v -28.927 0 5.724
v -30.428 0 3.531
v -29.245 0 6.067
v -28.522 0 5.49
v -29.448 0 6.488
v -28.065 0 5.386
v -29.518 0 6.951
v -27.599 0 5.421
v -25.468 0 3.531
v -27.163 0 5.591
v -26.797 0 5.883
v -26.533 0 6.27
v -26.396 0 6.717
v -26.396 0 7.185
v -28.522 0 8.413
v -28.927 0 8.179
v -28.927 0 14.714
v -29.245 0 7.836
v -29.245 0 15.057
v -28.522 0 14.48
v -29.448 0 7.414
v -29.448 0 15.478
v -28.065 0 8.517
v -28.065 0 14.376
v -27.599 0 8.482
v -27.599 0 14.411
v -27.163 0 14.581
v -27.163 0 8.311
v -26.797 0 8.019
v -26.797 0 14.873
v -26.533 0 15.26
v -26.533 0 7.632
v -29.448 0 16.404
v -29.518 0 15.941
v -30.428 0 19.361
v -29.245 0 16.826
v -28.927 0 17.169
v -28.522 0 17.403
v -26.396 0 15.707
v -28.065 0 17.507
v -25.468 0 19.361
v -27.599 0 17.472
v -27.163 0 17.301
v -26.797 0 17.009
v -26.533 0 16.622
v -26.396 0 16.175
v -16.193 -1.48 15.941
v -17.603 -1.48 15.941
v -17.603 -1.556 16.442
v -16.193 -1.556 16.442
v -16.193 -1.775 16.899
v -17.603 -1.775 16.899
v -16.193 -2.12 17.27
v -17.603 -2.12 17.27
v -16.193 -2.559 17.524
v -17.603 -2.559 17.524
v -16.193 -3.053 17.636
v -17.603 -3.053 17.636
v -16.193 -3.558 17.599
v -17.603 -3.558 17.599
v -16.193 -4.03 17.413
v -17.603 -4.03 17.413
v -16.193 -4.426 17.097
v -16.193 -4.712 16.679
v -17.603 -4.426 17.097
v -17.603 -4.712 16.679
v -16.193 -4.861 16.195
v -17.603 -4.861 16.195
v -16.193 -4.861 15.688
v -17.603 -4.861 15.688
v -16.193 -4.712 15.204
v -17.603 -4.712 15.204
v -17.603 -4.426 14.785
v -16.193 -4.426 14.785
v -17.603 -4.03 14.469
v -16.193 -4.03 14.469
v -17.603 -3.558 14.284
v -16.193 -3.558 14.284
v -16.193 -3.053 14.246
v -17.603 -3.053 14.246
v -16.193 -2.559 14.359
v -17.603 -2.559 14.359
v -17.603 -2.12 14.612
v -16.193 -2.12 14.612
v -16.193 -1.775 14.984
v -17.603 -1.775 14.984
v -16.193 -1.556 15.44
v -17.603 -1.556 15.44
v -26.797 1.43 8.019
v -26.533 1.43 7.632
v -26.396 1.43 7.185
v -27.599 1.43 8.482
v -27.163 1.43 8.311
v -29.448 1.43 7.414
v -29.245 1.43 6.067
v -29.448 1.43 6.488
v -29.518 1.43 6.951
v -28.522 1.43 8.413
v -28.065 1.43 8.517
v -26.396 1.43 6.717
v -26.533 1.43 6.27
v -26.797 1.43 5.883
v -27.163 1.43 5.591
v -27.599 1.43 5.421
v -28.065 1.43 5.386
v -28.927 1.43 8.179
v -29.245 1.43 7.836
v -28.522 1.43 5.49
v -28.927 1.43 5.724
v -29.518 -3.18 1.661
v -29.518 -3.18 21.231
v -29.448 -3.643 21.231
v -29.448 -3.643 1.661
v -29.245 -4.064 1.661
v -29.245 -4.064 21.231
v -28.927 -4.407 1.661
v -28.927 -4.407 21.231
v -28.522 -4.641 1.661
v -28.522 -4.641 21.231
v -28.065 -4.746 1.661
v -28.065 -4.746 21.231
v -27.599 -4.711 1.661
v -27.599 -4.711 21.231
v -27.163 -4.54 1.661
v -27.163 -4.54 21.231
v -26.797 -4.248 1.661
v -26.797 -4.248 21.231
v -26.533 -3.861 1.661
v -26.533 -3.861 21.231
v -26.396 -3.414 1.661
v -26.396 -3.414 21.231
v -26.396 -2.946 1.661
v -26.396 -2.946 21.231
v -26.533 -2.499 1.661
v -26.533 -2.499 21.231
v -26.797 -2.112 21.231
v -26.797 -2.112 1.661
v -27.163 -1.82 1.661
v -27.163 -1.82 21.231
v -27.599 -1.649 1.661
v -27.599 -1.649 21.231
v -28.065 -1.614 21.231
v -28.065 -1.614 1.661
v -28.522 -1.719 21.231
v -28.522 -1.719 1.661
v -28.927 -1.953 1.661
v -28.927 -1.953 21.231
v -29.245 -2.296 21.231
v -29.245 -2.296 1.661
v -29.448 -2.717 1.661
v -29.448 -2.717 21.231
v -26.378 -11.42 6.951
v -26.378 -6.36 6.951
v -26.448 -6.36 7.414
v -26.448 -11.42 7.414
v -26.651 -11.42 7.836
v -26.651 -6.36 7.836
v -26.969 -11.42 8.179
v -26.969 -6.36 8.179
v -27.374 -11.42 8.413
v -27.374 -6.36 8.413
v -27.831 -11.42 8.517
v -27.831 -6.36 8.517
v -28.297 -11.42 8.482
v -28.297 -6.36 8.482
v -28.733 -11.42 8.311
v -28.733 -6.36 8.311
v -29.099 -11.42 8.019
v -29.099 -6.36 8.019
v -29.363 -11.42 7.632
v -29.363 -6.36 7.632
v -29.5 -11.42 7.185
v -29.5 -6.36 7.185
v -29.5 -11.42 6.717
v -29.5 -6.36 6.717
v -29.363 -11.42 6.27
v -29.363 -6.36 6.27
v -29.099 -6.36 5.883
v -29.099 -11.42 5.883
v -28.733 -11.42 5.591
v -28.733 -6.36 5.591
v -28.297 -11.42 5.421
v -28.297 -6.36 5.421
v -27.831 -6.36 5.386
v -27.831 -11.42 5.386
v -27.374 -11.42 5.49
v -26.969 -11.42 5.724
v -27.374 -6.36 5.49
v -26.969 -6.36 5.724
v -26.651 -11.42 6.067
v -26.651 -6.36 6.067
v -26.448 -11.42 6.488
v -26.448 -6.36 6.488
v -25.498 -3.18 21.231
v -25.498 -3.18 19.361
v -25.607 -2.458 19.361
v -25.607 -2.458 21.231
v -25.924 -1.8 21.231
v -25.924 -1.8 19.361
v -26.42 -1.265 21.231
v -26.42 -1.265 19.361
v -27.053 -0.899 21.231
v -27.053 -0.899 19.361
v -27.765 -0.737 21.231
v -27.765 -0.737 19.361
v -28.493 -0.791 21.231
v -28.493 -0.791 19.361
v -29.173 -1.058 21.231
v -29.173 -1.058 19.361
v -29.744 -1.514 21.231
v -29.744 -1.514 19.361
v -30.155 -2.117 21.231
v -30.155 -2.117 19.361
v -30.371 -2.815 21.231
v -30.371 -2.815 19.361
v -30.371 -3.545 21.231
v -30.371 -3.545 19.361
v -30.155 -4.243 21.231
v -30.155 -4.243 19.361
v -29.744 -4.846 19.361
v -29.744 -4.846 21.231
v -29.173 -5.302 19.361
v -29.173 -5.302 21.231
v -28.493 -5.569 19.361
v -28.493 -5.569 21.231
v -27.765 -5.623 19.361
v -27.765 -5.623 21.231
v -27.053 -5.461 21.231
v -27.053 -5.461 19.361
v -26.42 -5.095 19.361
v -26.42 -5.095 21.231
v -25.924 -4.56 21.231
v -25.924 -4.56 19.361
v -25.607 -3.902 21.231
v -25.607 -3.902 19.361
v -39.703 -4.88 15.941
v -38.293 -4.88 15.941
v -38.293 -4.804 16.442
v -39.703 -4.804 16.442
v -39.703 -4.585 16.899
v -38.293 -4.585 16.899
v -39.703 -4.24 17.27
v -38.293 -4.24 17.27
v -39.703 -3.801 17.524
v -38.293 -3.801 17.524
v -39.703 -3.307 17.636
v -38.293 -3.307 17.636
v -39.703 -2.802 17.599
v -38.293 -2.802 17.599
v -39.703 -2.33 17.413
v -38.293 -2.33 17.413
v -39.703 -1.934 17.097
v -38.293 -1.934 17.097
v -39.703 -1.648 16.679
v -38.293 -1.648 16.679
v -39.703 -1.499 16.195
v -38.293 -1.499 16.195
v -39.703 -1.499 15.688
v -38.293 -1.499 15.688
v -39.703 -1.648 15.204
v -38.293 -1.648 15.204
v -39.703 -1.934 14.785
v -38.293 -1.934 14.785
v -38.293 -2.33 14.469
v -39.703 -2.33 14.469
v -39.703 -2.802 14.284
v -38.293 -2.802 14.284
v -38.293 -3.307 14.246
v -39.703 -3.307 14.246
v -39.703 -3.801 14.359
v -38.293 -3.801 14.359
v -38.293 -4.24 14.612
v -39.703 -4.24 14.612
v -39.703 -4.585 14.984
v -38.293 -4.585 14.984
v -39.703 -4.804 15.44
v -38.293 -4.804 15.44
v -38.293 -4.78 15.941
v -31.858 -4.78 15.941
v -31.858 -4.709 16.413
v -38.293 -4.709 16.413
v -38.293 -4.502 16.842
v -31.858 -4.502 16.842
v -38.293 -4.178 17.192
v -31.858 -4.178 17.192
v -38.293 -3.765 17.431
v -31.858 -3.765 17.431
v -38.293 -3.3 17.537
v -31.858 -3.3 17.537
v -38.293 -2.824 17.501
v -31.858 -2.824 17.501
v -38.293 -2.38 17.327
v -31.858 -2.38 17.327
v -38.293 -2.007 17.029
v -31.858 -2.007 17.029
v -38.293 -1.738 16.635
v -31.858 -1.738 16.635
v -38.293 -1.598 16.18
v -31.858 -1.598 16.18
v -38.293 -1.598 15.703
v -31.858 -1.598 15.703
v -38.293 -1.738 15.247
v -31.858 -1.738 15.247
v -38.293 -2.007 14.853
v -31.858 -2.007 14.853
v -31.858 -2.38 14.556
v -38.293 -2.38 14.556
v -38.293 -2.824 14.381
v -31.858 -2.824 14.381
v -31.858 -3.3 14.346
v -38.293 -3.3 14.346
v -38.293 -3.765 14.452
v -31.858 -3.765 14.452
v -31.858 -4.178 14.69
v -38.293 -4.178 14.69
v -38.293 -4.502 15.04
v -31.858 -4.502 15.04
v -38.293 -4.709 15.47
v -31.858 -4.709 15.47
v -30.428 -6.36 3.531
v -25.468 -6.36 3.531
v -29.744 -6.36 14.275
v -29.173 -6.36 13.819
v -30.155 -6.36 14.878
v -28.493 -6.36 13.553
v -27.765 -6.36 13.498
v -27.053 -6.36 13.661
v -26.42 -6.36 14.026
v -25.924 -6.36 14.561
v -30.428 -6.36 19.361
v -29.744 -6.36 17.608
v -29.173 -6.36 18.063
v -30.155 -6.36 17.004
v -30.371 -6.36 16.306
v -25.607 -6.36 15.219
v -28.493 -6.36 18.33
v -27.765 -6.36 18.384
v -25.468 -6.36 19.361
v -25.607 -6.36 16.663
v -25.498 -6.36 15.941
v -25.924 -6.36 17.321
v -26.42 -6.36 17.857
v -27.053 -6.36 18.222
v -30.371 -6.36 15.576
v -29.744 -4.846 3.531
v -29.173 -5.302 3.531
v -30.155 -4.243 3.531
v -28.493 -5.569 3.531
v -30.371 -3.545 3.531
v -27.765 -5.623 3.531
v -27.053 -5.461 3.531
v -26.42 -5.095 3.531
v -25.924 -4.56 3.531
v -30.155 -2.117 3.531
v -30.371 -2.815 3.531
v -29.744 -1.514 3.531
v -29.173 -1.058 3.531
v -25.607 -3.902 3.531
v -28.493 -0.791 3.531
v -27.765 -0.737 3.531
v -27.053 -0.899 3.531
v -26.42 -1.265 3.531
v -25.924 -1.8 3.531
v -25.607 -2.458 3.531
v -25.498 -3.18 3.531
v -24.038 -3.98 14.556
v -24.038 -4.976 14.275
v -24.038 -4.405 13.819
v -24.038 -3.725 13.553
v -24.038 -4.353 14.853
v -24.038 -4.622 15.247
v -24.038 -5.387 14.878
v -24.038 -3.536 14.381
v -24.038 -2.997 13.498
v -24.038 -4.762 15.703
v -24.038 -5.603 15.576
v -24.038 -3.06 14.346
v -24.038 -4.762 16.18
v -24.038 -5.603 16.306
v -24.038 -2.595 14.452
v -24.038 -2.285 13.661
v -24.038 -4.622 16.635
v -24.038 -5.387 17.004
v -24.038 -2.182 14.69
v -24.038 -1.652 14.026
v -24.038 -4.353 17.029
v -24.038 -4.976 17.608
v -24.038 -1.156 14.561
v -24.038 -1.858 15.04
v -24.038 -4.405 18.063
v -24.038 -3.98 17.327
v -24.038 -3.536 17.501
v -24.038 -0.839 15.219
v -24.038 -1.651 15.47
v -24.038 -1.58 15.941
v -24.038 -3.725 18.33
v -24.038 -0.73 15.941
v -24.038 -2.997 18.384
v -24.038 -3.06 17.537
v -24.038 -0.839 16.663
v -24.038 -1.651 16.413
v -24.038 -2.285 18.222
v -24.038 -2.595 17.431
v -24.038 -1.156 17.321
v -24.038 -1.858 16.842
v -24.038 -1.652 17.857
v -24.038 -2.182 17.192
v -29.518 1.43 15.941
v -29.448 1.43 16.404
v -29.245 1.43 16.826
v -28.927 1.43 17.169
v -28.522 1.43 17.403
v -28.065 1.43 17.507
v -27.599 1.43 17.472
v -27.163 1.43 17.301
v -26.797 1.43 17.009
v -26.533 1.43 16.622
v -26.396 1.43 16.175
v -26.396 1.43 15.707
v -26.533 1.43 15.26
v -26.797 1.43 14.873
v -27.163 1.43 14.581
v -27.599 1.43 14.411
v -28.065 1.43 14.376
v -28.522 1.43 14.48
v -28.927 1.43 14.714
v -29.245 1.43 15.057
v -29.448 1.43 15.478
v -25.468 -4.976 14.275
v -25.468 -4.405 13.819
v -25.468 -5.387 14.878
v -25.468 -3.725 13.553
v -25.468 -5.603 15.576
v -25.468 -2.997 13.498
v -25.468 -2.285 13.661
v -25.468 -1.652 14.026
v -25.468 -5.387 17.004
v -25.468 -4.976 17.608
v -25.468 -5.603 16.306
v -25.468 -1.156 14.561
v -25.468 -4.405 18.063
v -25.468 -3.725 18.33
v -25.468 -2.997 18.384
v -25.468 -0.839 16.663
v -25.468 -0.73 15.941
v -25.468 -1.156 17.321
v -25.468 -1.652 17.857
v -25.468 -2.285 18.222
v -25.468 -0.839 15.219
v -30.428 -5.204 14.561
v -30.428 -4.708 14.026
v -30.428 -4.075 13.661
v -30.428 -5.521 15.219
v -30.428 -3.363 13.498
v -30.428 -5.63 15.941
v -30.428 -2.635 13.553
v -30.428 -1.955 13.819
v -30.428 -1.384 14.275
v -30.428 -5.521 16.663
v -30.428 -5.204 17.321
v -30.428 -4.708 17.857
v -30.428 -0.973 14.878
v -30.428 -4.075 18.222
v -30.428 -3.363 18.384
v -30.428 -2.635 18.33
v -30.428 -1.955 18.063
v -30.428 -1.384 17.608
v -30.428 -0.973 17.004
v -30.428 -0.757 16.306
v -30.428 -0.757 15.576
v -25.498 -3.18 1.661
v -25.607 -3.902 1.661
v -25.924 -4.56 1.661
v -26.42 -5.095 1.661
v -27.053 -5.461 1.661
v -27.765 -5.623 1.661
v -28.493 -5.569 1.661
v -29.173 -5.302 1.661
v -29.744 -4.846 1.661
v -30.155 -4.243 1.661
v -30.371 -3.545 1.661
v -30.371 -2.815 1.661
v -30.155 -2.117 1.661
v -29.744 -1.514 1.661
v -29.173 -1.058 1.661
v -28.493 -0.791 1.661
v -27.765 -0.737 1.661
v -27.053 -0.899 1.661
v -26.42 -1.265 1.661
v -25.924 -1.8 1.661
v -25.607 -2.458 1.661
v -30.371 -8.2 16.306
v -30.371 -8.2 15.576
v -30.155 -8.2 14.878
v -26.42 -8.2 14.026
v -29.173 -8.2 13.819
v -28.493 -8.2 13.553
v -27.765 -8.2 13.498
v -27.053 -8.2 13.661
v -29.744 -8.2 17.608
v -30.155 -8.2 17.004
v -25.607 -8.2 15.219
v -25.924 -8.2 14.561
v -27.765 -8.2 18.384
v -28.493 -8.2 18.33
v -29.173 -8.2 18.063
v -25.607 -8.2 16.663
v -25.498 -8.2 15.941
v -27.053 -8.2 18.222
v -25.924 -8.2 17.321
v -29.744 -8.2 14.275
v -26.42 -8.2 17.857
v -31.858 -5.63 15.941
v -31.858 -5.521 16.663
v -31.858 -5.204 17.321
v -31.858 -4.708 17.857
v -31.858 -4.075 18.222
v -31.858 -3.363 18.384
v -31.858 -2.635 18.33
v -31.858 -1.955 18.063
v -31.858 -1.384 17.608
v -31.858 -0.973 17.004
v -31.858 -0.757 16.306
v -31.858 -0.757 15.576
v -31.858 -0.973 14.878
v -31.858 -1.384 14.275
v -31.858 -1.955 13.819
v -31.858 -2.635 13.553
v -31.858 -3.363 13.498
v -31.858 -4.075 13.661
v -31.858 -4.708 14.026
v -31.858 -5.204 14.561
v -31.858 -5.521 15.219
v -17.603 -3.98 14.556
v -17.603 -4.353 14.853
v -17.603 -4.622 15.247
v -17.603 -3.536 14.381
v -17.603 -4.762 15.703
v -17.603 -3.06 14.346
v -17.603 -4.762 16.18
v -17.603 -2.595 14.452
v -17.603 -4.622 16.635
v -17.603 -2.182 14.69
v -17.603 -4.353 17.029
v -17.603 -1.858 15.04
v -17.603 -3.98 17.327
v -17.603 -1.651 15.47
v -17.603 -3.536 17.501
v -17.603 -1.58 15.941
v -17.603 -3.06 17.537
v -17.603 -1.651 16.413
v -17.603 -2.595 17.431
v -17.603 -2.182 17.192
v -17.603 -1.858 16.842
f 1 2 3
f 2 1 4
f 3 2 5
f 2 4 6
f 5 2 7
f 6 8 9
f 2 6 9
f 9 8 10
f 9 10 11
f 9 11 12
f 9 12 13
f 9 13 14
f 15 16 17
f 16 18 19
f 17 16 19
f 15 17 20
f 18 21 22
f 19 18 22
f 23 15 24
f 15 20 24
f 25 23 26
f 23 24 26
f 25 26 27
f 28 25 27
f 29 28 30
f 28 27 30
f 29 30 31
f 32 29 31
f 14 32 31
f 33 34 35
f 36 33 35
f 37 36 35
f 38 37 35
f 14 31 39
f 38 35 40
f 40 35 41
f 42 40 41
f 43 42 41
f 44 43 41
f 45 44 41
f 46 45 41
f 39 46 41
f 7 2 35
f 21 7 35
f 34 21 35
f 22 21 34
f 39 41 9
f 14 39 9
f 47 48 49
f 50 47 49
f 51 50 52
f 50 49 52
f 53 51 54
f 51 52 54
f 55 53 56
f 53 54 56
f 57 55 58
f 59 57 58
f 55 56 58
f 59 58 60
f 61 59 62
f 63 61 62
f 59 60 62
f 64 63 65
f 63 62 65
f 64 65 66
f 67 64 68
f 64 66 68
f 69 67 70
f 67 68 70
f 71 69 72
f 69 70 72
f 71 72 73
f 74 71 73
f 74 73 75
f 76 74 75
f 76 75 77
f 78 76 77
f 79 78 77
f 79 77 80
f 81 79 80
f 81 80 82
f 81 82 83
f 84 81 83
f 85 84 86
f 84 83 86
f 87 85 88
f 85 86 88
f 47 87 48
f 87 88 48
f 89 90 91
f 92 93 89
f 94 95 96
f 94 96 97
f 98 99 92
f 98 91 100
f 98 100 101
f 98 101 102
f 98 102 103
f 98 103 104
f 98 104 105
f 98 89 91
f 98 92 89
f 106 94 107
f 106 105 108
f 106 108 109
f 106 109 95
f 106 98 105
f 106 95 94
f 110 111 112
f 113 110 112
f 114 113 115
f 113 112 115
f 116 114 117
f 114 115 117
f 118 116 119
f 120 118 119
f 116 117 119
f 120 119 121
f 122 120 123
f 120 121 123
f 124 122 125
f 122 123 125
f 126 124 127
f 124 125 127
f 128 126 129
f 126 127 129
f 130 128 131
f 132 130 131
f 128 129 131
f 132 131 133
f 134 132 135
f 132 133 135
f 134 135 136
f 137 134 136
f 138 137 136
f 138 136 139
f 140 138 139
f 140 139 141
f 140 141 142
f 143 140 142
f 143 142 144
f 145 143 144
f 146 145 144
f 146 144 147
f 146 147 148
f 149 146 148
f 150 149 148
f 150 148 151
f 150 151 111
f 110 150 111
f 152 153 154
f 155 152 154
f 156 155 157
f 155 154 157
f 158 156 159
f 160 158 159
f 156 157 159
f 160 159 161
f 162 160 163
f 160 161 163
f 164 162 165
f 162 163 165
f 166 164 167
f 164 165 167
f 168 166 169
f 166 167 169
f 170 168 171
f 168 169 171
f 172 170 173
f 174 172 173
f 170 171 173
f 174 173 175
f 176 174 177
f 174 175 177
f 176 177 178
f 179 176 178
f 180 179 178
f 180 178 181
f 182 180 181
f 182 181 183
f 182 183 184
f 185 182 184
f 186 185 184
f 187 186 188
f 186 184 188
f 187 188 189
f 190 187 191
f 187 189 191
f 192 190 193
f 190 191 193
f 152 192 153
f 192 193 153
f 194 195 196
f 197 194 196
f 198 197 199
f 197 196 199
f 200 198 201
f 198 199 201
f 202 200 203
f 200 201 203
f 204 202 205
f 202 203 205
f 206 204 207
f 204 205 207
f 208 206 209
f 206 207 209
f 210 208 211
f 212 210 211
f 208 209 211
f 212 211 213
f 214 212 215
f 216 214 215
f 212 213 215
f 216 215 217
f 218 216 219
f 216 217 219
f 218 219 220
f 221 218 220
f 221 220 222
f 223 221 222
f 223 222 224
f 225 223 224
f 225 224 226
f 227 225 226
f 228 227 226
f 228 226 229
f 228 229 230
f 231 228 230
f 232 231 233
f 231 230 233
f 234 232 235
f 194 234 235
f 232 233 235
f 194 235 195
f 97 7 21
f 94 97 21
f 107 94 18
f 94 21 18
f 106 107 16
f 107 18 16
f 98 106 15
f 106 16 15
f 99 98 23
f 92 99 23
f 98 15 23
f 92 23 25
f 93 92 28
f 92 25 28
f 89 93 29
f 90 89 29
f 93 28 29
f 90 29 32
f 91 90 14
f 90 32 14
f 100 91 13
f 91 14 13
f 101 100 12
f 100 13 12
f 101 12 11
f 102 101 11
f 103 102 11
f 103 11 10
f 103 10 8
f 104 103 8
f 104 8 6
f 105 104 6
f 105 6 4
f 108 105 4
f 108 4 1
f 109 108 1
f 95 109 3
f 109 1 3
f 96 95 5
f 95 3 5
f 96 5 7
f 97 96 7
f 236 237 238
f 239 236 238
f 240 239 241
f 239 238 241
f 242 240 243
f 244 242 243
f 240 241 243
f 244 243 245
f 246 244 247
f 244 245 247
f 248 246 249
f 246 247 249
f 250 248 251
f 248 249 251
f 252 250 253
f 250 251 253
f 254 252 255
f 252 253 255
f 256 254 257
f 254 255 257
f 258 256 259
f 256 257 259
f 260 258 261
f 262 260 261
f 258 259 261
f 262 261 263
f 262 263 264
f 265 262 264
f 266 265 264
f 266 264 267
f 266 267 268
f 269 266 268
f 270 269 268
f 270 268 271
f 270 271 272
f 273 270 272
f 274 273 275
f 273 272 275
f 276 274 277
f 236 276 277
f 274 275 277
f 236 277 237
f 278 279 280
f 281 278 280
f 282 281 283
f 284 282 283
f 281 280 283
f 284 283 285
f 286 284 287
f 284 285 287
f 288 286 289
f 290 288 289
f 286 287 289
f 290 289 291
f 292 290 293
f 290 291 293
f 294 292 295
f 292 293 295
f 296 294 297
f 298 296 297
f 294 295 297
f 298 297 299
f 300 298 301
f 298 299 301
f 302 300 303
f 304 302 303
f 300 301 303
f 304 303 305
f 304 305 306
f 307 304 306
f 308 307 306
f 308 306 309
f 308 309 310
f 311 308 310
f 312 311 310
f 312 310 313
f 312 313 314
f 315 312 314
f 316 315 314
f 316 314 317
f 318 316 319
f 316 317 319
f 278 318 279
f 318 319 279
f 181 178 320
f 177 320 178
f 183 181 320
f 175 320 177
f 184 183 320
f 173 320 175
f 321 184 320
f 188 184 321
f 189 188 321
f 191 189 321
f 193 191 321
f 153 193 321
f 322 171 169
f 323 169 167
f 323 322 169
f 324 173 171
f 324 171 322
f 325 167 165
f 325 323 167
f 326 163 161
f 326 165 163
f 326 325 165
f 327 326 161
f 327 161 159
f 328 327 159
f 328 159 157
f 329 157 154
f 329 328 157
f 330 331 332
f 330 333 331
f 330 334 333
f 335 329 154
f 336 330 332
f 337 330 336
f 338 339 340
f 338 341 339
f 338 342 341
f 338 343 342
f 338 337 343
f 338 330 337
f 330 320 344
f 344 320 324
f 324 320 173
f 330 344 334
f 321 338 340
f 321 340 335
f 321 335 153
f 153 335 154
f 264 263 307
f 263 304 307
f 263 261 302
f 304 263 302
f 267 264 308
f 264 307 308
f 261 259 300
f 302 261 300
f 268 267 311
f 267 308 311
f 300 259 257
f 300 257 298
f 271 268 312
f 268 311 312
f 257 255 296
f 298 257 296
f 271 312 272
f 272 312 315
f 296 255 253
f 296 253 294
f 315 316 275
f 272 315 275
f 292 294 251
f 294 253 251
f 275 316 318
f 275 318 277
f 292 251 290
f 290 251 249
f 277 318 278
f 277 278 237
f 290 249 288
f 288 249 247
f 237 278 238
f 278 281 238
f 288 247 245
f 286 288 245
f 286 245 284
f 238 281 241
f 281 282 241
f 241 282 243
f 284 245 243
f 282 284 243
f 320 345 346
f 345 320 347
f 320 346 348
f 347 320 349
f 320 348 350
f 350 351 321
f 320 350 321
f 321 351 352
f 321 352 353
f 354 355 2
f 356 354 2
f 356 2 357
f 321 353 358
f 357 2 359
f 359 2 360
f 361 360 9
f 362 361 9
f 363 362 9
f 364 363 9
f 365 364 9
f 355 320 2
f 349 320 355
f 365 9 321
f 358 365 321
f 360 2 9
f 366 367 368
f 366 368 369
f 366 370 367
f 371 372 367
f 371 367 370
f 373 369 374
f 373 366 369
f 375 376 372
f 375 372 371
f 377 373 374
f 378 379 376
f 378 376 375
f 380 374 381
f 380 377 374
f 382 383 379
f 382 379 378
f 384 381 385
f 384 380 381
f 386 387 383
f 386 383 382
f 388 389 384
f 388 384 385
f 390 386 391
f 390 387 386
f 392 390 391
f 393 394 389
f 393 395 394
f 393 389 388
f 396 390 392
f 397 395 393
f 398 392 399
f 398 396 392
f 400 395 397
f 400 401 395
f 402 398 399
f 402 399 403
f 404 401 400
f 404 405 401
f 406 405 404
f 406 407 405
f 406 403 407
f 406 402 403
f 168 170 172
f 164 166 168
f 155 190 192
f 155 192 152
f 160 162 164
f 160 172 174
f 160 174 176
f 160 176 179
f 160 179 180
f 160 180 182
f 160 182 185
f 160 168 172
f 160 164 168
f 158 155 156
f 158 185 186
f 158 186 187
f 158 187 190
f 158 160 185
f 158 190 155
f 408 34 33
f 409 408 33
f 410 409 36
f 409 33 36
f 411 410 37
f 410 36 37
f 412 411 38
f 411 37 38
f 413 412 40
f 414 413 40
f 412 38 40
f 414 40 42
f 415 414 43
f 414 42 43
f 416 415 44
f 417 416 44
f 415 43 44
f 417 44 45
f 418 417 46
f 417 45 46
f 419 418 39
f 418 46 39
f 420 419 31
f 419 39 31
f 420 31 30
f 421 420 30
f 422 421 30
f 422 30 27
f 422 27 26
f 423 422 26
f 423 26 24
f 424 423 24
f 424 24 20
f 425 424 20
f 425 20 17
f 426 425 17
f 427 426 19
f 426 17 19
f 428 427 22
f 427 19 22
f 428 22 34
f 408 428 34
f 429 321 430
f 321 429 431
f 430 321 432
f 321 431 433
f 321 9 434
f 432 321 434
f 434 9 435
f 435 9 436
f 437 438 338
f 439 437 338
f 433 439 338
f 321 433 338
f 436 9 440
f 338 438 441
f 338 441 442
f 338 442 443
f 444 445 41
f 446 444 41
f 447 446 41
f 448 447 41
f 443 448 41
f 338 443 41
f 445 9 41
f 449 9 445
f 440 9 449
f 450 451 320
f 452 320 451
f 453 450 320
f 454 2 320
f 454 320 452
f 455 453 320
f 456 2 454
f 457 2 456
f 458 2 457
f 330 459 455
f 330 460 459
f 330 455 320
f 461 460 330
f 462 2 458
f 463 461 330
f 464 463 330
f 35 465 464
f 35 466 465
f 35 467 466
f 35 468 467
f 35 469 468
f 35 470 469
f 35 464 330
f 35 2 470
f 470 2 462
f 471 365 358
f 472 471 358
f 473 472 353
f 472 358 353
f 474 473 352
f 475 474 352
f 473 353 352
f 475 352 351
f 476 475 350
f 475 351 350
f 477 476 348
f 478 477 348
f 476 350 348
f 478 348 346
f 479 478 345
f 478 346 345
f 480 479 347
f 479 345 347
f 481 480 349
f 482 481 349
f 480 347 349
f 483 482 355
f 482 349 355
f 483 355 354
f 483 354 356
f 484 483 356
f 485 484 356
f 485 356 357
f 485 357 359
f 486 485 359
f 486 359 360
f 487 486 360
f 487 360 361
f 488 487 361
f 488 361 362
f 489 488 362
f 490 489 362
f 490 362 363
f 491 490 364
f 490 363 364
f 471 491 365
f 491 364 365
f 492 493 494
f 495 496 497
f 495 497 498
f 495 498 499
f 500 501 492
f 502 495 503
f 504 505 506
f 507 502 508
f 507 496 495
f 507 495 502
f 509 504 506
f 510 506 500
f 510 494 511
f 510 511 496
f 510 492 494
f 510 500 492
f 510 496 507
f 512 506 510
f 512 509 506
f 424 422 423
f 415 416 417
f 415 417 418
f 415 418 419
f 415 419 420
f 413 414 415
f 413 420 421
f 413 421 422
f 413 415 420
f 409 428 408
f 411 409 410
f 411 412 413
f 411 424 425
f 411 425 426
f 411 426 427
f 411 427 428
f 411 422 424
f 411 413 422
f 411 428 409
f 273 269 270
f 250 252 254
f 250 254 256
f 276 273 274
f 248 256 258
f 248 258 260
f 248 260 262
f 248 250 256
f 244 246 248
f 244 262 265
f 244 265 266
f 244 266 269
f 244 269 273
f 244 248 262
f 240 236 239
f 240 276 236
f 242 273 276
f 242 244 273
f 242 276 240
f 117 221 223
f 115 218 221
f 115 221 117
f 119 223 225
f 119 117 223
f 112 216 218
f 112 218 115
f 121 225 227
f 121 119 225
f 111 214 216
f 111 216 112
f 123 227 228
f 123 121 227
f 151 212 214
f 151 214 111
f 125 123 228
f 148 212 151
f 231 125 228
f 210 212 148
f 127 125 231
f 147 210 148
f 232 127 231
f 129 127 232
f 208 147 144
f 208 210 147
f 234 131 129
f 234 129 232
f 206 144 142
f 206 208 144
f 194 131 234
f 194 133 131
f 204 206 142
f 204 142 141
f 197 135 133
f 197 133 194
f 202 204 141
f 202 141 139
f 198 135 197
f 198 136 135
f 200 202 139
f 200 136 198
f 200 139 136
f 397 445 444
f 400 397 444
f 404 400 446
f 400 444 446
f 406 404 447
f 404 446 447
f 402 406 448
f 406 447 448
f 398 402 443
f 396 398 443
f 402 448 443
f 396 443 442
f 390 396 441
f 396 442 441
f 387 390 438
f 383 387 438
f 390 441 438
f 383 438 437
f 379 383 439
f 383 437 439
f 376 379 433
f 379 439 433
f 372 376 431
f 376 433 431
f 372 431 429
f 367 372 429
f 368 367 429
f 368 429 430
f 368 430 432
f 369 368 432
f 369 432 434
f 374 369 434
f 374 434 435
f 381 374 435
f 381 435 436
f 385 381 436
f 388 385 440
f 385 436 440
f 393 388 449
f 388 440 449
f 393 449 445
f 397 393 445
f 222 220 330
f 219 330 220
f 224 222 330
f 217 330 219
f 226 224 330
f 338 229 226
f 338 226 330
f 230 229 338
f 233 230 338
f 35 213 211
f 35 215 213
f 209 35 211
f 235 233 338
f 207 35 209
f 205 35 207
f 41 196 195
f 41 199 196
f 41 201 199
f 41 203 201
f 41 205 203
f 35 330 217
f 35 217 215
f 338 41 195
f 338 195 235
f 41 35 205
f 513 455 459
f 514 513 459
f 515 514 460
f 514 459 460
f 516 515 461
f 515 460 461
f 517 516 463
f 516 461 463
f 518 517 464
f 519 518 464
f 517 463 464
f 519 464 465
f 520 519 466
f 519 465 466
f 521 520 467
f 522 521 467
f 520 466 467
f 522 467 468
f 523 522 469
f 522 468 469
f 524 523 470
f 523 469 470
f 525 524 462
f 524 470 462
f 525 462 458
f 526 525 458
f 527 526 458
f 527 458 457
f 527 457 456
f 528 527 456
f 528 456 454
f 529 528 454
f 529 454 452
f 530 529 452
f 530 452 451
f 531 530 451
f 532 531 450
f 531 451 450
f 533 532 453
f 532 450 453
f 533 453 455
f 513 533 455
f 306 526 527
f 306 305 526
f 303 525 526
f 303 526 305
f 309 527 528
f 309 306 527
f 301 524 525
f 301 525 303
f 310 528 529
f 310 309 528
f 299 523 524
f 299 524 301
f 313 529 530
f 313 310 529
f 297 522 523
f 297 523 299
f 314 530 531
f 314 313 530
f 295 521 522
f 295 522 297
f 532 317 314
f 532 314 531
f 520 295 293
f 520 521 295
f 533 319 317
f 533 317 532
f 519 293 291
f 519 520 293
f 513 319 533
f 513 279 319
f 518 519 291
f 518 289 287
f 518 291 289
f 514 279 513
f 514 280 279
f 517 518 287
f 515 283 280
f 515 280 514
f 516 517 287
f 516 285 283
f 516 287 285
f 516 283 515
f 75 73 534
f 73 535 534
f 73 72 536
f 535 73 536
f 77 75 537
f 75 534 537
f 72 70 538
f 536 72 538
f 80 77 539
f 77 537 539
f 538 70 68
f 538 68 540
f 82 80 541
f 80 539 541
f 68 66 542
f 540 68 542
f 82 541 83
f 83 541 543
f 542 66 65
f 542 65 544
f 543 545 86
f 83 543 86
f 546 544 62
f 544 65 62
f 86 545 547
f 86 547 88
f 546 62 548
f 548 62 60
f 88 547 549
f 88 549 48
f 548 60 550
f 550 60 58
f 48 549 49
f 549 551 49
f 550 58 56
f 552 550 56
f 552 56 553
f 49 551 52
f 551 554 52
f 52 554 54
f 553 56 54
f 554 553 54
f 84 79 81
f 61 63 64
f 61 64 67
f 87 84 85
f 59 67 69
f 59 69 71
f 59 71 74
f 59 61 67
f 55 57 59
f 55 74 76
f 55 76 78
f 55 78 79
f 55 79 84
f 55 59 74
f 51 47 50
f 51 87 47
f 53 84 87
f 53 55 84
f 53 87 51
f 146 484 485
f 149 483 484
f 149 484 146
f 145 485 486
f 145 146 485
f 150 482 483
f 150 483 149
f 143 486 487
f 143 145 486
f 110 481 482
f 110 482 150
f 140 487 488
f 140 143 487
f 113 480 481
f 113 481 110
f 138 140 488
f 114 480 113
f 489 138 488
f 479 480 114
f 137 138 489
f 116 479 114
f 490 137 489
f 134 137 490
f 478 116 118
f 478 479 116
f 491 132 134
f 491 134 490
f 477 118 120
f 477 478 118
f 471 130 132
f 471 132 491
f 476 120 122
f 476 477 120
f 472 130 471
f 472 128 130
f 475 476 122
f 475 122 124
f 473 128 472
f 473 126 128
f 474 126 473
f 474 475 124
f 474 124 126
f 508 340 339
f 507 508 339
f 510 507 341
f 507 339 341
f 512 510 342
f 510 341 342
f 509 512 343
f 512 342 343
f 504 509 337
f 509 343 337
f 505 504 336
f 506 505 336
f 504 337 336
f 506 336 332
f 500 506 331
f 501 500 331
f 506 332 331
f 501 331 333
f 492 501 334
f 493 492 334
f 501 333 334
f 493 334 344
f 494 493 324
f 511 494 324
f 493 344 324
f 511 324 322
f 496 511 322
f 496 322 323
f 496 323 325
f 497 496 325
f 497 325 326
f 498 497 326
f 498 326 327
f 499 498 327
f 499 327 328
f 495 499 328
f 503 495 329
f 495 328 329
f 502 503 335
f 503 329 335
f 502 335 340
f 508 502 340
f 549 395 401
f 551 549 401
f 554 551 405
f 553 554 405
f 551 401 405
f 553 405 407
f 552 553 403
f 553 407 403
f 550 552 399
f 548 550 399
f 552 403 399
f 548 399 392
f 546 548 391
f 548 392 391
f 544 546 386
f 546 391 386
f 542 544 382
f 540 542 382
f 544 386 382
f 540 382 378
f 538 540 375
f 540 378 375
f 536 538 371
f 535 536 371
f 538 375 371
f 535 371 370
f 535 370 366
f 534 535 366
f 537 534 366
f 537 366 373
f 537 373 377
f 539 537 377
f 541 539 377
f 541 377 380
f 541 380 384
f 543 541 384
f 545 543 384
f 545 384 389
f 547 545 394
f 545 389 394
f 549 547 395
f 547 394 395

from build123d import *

# Parameters (mm, degrees)
F0_W      = 4.96
F0_H      = 15.83
F1_DEPTH  = 6.36
F2_R      = 2.45
F3_DEPTH  = 1.84
F4_R      = 2.45
F5_DEPTH  = 1.87
F6_R      = 2.45
F7_DEPTH  = 1.87
F9_D      = 3.14
F10_R     = 2.45
F11_DEPTH = 1.43
F12_R     = 2.45
F13_DEPTH = 1.43
F14_R     = 1.57
F15_DEPTH = 5.06
F16_R     = 1.57
F17_DEPTH = 1.43
F18_R     = 1.6
F19_DEPTH = 6.435
F20_R     = 1.7
F21_DEPTH = 1.41
F22_R     = 1.6
F23_DEPTH = 6.435
F24_R     = 1.7
F25_DEPTH = 1.41


with BuildPart() as f1:
    # F0 (on Front) → F1 (new body)
    with BuildSketch(Plane.XZ):
        with Locations((-27.94799, 11.446154)):
            Rectangle(F0_W, F0_H)
    extrude(amount=F1_DEPTH)

    # F2 (on face) → F3 (join)
    with BuildSketch(Plane.XZ.offset(6.36)):
        with Locations((-27.94799, 15.941154)):
            Circle(F2_R)
    extrude(amount=F3_DEPTH)

    # F4 (on face) → F5 (join)
    with BuildSketch(Plane.XY.offset(19.361154)):
        with Locations((-27.94799, -3.18)):
            Circle(F4_R)
    extrude(amount=F5_DEPTH)

    # F6 (on face) → F7 (join)
    with BuildSketch(Plane(origin=(0, 0, 3.531154), x_dir=(1, 0, 0), z_dir=(0, 0, -1))):
        with Locations((-27.94799, 3.18)):
            Circle(F6_R)
    extrude(amount=F7_DEPTH)

    # F9 (through all)
    with Locations(Plane(origin=(0, 0, 1.661154), x_dir=(1, 0, 0), z_dir=(0, 0, -1))):
        with Locations((-27.94799, 3.18)):
            Hole(F9_D / 2)

    # F10 (on face) → F11 (join)
    with BuildSketch(Plane.YZ.offset(-25.46799)):
        with Locations((-3.18, 15.941154)):
            Circle(F10_R)
    extrude(amount=F11_DEPTH)

    # F12 (on face) → F13 (join)
    with BuildSketch(Plane(origin=(-30.42799, 0, 0), x_dir=(0, -1, 0), z_dir=(-1, 0, 0))):
        with Locations((3.18, 15.941154)):
            Circle(F12_R)
    extrude(amount=F13_DEPTH)

    # F14 (on face) → F15 (join)
    with BuildSketch(Plane.XZ.offset(6.36)):
        with Locations((-27.94799, 6.951154)):
            Circle(F14_R)
    extrude(amount=F15_DEPTH)

    # F16 (on face) → F17 (join)
    with BuildSketch(Plane(origin=(0, 0, 0), x_dir=(-1, 0, 0), z_dir=(0, 1, 0))):
        with Locations((27.94799, 15.941154)):
            Circle(F16_R)
        with Locations((27.94799, 6.951154)):
            Circle(F16_R)
    extrude(amount=F17_DEPTH)

    # F18 (on face) → F19 (join)
    with BuildSketch(Plane(origin=(-31.85799, 0, 0), x_dir=(0, -1, 0), z_dir=(-1, 0, 0))):
        with Locations((3.18, 15.941154)):
            Circle(F18_R)
    extrude(amount=F19_DEPTH)

    # F20 (on face) → F21 (join)
    with BuildSketch(Plane(origin=(-38.29299, 0, 0), x_dir=(0, -1, 0), z_dir=(-1, 0, 0))):
        with Locations((3.18, 15.941154)):
            Circle(F20_R)
    extrude(amount=F21_DEPTH)

    # F22 (on face) → F23 (join)
    with BuildSketch(Plane.YZ.offset(-24.03799)):
        with Locations((-3.18, 15.941154)):
            Circle(F22_R)
    extrude(amount=F23_DEPTH)

    # F24 (on face) → F25 (join)
    with BuildSketch(Plane.YZ.offset(-17.60299)):
        with Locations((-3.18, 15.941154)):
            Circle(F24_R)
    extrude(amount=F25_DEPTH)


solid = f1.part
